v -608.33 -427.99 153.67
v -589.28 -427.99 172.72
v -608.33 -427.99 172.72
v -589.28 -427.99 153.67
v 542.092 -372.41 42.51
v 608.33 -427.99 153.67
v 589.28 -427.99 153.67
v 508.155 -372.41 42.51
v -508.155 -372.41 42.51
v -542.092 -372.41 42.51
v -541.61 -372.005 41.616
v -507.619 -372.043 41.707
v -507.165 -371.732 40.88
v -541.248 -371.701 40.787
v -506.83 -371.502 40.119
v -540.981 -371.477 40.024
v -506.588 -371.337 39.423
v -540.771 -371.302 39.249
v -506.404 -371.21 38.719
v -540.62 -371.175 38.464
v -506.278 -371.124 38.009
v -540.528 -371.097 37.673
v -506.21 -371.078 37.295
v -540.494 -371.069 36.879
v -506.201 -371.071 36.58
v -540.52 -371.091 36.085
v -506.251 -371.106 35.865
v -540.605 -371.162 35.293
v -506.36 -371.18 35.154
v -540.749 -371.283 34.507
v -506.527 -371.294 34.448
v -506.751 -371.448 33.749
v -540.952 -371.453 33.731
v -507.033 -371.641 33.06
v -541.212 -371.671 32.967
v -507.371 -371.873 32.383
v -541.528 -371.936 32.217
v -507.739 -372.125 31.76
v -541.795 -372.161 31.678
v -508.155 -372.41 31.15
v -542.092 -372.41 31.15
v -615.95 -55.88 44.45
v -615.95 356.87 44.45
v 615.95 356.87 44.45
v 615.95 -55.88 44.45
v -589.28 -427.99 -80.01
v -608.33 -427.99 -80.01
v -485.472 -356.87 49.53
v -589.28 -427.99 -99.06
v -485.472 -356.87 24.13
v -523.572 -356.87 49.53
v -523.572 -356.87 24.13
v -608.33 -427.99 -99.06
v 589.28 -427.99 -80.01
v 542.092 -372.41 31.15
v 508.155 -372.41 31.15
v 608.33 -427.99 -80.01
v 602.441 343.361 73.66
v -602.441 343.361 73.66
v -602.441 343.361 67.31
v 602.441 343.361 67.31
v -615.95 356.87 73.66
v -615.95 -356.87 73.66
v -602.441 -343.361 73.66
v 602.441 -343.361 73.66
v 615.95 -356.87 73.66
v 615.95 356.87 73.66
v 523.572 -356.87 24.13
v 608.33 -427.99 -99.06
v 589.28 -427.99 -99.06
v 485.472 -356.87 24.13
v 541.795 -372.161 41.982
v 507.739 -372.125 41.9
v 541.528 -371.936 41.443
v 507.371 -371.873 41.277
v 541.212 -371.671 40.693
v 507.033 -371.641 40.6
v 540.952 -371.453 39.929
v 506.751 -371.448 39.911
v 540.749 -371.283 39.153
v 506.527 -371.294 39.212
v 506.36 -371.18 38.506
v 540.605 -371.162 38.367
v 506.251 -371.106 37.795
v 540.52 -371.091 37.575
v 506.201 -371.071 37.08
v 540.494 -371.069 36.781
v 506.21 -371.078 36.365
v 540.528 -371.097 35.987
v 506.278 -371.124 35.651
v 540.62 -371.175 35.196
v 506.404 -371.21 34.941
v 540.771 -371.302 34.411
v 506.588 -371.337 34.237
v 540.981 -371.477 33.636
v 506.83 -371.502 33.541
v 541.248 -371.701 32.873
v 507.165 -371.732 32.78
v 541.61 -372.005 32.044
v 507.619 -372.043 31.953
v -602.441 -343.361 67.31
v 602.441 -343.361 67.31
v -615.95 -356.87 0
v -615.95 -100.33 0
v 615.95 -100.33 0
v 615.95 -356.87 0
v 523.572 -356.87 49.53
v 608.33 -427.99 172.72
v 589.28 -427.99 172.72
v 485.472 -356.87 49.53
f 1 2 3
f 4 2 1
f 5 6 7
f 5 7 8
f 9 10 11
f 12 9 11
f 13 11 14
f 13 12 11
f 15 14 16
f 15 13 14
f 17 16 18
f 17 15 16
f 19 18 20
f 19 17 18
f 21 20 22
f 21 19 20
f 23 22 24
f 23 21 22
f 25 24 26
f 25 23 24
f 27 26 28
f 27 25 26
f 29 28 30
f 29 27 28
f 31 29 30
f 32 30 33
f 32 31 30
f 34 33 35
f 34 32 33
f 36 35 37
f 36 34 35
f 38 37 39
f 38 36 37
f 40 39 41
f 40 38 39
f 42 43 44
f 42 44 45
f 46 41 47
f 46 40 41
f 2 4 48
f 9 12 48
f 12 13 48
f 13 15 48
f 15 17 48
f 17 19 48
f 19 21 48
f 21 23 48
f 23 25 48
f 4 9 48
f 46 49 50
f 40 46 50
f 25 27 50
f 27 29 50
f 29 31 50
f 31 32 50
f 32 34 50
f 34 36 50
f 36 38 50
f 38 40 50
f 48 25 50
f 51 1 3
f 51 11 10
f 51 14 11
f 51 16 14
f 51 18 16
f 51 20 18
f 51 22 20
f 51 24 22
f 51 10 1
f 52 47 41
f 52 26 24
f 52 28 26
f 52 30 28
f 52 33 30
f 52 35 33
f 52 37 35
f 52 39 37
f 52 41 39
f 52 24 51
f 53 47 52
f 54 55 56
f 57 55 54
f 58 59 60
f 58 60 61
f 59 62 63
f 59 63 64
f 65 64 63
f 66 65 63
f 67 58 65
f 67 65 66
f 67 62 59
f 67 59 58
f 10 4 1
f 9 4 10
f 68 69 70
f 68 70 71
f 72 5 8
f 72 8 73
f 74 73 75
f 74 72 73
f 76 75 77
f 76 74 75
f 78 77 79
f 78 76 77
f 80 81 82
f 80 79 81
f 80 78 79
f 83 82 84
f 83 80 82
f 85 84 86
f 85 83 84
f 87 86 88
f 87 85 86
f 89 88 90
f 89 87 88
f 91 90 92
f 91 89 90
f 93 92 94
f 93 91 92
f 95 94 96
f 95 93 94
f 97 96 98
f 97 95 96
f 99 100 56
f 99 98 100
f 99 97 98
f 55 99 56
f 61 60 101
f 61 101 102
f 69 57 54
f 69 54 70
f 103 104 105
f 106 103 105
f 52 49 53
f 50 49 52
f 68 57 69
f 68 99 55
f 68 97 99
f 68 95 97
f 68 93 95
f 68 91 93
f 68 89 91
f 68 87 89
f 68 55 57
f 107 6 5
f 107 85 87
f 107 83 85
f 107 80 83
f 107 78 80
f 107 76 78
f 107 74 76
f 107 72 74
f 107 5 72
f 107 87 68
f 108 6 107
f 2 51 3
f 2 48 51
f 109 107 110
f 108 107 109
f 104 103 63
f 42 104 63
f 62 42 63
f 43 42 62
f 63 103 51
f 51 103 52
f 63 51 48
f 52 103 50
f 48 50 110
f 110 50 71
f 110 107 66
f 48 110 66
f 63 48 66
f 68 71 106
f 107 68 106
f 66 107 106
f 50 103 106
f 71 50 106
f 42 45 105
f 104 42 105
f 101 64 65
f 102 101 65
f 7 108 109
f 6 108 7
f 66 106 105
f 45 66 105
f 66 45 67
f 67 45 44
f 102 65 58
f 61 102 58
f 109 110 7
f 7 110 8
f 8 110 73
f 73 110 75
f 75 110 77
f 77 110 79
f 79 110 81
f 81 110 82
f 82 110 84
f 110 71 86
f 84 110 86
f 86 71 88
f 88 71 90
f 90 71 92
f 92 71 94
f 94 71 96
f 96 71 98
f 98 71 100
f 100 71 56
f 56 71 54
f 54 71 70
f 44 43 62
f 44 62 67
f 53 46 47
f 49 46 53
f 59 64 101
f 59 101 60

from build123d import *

# Parameters (mm, degrees)
SKETCH2_W           = 1231.9
SKETCH2_H           = 713.74
BOSS_EXTRUDE1_DEPTH = 73.66
BOSS_EXTRUDE2_DEPTH = 608.33
FILLET1_R           = 12.7
CUT_EXTRUDE1_DEPTH  = 1316.517103082
CUT_EXTRUDE2_DEPTH  = 608.33
SKETCH6_W           = 1204.881325014
SKETCH6_H           = 686.721325014
CUT_EXTRUDE3_DEPTH  = 6.35


with BuildPart() as part:
    # Sketch2 → Boss-Extrude1 (new body)
    with BuildSketch(Plane.XY):
        Rectangle(SKETCH2_W, SKETCH2_H)
    extrude(amount=BOSS_EXTRUDE1_DEPTH)

    # Sketch3 → Boss-Extrude2 (add, symmetric)
    with BuildSketch(Plane(origin=(0, 0, 0), x_dir=(0, 0, -1), z_dir=(1, 0, 0))):
        Polygon((-49.53, -356.87), (-172.72, -427.99), (-153.67, -427.99), (-36.83, -369.57), (80.01, -427.99), (99.06, -427.99), (-24.13, -356.87), align=None)
    extrude(amount=BOSS_EXTRUDE2_DEPTH, both=True)

    # Fillet1
    fillet1_edges = [part.edges().sort_by_distance(p)[0] for p in [
        (0, -369.57, 36.83),
    ]]
    fillet(fillet1_edges, radius=FILLET1_R)

    # Sketch4 → Cut-Extrude1 (cut, through all)
    with BuildSketch(Plane(origin=(615.95, 0, 0), x_dir=(0, 0, -1), z_dir=(1, 0, 0))):
        Polygon((0, 356.87), (-44.45, 356.87), (-44.45, -55.88), (0, -100.33), align=None)
    extrude(amount=-CUT_EXTRUDE1_DEPTH, mode=Mode.SUBTRACT)

    # Sketch5 → Cut-Extrude2 (cut, symmetric)
    with BuildSketch(Plane.XY):
        Polygon((-608.33, -427.99), (-523.572484495, -356.87), (-608.33, -356.87), align=None)
        Polygon((-589.28, -427.99), (-485.472484495, -356.87), (485.472484495, -356.87), (589.28, -427.99), align=None)
        Polygon((608.33, -356.87), (608.33, -427.99), (523.572484495, -356.87), align=None)
    extrude(amount=CUT_EXTRUDE2_DEPTH, both=True, mode=Mode.SUBTRACT)

    # Sketch6 → Cut-Extrude3 (cut)
    with BuildSketch(Plane.XY.offset(73.66)):
        Rectangle(SKETCH6_W, SKETCH6_H)
    extrude(amount=-CUT_EXTRUDE3_DEPTH, mode=Mode.SUBTRACT)


solid = part.part
